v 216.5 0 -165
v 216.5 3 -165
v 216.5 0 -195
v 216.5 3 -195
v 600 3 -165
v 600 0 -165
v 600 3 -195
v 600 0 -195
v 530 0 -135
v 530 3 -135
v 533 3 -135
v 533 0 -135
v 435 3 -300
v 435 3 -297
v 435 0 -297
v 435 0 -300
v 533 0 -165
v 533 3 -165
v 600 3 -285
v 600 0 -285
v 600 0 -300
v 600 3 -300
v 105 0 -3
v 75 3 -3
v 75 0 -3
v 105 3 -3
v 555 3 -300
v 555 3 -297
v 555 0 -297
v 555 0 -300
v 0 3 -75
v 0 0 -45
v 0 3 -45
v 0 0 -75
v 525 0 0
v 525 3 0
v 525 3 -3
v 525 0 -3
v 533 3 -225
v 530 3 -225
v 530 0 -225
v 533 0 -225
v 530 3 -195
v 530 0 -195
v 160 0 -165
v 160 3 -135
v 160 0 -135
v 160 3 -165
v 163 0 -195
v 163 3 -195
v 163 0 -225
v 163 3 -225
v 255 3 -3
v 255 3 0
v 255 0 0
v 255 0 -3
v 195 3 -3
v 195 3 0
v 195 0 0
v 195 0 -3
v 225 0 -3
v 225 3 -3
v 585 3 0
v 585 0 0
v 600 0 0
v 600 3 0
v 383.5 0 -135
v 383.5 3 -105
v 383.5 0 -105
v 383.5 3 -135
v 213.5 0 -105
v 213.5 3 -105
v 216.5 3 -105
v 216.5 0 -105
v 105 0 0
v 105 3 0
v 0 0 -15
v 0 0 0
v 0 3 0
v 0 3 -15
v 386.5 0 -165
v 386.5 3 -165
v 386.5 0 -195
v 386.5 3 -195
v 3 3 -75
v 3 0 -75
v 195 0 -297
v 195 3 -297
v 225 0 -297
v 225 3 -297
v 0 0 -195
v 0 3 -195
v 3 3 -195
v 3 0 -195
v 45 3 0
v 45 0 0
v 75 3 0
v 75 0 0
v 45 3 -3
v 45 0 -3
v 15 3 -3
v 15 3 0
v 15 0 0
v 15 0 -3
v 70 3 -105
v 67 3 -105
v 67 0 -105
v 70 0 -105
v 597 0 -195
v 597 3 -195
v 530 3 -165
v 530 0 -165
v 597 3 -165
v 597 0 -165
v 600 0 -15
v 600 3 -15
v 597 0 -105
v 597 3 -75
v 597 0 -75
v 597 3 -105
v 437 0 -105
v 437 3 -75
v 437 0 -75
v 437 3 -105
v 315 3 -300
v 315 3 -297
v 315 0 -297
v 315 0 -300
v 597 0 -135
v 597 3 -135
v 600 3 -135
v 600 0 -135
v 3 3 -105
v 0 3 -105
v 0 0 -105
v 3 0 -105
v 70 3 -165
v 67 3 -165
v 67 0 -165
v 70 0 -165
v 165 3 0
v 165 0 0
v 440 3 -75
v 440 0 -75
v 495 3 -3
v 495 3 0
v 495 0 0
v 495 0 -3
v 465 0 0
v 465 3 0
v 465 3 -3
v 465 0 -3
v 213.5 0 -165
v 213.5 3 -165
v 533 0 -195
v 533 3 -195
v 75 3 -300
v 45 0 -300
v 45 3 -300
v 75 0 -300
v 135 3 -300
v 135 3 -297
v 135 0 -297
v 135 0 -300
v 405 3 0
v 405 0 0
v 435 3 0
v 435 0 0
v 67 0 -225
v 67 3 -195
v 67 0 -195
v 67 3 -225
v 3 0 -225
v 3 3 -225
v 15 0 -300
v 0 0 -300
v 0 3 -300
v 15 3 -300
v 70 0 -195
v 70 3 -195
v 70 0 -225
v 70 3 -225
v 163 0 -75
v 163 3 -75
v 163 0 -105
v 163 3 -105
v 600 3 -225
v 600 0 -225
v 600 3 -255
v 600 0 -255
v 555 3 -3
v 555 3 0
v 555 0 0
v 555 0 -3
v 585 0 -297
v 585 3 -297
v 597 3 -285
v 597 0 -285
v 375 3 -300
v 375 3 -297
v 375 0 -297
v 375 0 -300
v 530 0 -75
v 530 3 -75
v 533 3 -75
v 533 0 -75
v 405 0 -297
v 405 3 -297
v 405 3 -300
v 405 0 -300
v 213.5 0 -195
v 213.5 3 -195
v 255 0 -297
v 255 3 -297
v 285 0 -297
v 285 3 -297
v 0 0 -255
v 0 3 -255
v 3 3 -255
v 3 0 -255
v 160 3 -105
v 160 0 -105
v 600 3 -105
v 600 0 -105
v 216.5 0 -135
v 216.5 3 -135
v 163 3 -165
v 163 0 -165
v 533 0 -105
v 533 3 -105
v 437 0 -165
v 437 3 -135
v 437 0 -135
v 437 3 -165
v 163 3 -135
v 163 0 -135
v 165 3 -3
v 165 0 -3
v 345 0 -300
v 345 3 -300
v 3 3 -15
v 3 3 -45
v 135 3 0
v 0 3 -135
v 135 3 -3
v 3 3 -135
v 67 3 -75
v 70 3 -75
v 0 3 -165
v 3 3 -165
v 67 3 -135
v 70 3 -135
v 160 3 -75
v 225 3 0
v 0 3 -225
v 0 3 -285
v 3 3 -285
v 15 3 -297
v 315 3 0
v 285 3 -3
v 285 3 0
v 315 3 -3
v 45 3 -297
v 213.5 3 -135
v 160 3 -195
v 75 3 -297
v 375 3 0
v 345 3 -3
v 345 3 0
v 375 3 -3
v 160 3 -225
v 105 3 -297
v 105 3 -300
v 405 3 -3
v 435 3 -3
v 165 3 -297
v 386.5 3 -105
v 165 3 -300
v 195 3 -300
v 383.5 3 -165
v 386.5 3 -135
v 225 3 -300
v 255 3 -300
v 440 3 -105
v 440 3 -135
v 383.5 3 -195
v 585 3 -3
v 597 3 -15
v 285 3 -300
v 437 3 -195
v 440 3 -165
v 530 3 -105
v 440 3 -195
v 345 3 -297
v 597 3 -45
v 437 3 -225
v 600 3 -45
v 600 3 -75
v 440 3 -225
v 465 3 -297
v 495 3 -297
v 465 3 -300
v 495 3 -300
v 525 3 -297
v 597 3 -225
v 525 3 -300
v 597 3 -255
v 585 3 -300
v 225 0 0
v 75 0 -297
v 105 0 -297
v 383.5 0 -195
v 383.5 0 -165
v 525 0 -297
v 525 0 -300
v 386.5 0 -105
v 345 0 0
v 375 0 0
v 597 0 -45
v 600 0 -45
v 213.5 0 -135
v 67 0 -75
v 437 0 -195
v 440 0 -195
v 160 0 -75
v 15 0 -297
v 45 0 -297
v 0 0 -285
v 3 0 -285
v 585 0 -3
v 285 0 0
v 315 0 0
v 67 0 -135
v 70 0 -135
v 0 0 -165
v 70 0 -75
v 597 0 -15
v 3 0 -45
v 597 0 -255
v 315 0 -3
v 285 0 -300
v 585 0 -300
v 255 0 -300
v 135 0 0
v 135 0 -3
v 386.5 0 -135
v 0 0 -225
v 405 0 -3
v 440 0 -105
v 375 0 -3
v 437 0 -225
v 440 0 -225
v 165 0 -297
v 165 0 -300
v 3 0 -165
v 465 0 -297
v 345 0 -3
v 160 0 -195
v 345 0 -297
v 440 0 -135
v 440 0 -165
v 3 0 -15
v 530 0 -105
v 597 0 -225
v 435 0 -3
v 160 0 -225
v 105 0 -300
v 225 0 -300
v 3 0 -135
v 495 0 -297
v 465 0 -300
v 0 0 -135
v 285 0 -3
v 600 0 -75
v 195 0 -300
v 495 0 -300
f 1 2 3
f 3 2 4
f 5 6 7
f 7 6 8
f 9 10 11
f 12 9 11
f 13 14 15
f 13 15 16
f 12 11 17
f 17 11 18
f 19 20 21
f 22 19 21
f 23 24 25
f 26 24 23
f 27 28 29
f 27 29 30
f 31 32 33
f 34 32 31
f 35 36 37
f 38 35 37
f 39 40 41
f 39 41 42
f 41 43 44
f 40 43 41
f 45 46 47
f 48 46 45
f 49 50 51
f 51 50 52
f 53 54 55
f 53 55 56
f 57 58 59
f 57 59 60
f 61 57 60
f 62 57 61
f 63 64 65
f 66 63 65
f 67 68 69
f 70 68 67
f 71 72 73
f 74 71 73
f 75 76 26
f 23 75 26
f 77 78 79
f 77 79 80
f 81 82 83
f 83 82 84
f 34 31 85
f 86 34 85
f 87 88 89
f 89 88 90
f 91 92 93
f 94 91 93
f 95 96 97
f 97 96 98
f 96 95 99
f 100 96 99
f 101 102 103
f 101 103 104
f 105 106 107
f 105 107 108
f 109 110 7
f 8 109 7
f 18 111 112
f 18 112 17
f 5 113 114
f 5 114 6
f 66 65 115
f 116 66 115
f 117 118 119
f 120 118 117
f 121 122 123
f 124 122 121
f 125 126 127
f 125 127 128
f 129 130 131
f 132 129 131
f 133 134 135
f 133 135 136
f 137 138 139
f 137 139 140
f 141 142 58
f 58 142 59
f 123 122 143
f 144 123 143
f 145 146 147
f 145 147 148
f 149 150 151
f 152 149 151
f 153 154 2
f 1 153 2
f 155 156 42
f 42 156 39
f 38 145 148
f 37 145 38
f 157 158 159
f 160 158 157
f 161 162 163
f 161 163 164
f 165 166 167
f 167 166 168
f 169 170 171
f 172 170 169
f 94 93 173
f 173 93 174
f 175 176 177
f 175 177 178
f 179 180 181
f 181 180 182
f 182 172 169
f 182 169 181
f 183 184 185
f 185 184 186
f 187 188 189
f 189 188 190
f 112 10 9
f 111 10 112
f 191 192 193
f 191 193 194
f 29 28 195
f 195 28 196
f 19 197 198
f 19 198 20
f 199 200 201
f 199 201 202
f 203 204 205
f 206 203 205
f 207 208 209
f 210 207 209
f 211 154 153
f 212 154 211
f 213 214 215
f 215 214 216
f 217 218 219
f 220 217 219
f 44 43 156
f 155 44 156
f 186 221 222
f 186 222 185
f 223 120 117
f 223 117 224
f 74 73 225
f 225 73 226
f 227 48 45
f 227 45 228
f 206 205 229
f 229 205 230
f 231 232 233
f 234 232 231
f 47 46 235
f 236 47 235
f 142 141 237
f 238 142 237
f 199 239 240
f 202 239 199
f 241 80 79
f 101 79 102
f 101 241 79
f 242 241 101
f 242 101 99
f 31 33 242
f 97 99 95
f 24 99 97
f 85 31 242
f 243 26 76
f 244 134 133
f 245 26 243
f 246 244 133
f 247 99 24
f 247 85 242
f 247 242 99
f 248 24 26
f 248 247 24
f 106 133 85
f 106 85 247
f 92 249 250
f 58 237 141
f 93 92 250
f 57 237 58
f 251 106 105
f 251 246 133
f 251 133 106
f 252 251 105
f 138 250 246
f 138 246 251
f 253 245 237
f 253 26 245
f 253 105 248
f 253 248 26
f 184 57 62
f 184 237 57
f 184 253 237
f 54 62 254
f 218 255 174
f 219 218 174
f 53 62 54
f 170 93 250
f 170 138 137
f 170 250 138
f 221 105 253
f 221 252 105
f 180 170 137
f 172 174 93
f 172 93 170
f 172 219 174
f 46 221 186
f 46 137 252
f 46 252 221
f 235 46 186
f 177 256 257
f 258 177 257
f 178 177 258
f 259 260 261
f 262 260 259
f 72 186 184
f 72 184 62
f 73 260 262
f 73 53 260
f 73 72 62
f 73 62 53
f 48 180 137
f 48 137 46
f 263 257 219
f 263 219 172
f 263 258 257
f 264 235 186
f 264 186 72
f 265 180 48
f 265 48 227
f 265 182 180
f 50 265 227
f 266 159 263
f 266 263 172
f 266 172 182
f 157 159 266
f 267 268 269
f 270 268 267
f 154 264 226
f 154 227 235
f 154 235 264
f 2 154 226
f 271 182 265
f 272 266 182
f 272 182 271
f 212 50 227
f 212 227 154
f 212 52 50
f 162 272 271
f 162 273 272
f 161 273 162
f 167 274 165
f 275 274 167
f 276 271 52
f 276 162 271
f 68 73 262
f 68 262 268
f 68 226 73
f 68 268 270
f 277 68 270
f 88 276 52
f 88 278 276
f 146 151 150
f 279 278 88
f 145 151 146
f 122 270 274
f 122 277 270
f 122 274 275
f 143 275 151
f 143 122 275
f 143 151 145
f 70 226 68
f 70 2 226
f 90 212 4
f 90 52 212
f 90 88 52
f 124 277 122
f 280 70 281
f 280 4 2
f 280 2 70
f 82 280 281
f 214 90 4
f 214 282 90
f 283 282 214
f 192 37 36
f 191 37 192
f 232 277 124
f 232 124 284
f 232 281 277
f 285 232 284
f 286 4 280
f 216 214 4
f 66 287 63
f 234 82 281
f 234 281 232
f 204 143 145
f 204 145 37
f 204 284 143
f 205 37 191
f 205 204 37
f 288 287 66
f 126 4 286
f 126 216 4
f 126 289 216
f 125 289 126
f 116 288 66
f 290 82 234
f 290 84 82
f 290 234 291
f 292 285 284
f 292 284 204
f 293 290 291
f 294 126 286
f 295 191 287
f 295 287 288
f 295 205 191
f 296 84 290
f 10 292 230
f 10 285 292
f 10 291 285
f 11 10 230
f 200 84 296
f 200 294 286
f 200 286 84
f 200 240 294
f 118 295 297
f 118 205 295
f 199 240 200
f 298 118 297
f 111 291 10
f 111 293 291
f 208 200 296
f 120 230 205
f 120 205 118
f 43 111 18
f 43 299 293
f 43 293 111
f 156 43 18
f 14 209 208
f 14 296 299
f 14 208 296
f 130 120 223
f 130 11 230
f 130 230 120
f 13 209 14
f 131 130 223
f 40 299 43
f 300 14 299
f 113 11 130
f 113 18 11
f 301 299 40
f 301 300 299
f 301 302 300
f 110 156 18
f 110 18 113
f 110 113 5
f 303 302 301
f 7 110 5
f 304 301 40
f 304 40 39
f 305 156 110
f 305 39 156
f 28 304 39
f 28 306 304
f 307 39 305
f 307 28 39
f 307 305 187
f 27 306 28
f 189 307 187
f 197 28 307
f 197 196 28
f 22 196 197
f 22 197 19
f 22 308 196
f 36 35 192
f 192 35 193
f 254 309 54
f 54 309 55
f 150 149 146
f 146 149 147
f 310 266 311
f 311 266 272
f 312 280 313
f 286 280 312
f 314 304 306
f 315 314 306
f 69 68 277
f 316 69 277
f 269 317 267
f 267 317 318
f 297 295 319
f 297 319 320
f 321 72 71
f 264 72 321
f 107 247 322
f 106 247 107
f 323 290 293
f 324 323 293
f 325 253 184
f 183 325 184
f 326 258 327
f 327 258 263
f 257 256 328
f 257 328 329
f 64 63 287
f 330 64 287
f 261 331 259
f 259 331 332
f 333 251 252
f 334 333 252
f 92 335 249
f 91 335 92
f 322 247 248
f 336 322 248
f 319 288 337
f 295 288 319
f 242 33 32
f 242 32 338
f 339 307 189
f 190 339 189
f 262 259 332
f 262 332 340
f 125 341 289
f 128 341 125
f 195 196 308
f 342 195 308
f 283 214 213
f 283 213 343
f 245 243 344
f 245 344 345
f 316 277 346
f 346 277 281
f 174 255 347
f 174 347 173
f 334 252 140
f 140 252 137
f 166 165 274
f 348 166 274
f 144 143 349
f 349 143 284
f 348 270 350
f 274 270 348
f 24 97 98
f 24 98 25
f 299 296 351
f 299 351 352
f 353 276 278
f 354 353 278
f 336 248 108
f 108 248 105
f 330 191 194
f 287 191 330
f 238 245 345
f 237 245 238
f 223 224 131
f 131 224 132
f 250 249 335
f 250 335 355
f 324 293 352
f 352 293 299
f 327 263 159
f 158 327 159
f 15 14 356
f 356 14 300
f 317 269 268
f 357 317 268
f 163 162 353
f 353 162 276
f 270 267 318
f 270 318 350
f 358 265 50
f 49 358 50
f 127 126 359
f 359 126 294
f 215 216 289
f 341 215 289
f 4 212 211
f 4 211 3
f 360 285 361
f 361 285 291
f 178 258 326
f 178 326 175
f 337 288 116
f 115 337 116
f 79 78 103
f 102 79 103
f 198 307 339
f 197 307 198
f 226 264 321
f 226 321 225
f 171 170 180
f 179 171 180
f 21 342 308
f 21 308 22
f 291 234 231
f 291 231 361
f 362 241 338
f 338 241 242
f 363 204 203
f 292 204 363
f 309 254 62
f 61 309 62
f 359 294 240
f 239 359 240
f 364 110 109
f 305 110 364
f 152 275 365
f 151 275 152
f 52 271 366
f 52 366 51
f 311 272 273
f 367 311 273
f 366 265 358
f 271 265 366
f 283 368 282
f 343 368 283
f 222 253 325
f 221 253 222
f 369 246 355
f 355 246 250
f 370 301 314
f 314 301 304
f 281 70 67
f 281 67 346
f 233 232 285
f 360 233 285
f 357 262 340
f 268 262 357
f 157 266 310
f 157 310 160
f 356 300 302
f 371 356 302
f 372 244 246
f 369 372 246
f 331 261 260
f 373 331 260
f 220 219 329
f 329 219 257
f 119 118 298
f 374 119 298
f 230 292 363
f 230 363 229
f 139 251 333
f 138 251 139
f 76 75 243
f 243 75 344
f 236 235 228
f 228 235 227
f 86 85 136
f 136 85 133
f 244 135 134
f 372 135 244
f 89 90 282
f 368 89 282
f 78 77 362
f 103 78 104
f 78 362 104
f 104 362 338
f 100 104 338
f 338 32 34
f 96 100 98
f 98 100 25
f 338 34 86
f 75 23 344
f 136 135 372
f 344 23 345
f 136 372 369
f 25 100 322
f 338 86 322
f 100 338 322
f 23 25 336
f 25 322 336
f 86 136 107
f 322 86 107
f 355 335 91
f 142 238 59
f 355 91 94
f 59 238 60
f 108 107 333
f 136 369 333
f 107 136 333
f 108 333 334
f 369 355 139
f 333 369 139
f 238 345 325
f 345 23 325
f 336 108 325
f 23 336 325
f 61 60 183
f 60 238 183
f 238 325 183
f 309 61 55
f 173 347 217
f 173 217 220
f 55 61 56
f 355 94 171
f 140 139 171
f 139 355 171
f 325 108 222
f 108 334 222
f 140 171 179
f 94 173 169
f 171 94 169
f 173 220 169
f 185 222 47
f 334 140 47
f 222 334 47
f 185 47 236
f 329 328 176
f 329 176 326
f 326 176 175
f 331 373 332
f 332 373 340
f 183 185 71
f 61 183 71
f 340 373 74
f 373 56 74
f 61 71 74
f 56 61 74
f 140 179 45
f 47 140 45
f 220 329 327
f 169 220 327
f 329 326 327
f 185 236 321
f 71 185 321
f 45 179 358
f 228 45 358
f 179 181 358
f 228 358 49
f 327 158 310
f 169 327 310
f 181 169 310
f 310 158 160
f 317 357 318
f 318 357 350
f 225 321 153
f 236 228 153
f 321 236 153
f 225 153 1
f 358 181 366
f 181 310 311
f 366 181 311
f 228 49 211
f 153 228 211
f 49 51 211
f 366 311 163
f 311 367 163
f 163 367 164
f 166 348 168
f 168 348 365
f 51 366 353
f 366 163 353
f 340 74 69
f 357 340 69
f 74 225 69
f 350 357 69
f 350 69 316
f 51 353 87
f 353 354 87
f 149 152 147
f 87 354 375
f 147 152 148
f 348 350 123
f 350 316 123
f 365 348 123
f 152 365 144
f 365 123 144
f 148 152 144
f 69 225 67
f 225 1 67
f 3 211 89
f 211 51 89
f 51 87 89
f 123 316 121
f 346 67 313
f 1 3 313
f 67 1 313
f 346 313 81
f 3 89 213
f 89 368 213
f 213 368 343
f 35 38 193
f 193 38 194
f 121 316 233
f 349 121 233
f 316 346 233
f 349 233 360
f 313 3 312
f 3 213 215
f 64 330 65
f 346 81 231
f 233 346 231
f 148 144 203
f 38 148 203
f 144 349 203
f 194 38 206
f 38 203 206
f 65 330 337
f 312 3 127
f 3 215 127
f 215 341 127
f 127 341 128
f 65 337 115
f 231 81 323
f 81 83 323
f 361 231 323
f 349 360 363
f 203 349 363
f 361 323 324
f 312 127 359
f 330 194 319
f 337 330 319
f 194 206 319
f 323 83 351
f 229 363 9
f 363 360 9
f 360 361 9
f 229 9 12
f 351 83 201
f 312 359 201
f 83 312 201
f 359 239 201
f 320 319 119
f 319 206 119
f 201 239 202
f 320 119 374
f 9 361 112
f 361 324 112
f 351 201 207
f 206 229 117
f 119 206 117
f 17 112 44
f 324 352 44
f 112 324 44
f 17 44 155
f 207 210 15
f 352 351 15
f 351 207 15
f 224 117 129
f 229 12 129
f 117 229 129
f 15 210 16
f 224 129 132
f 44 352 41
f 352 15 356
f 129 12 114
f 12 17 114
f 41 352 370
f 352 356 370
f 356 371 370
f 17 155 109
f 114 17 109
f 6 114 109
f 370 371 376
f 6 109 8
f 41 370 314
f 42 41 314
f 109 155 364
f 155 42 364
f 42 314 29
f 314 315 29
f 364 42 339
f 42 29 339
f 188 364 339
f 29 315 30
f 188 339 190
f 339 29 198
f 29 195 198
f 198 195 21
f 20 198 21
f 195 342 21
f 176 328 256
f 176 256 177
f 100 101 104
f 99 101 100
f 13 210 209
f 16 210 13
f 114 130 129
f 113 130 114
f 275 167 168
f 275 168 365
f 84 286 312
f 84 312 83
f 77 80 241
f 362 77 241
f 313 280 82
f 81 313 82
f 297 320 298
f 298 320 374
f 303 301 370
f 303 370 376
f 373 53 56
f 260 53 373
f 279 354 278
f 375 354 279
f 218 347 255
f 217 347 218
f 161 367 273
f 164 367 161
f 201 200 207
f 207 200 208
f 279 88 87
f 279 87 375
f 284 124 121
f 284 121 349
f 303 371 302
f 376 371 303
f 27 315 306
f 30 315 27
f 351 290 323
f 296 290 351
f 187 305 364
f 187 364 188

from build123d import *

# Parameters (mm, degrees)
SKETCH1_W           = 600
SKETCH1_H           = 300
BOSS_EXTRUDE1_DEPTH = 3
SKETCH2_W           = 30
SKETCH2_H           = 3
SKETCH2_W_2         = 3
SKETCH2_H_2         = 30
CUT_EXTRUDE1_DEPTH  = 5
SKETCH3_W           = 3
SKETCH3_H           = 30
CUT_EXTRUDE2_DEPTH  = 10
SKETCH4_W           = 3
SKETCH4_H           = 30
CUT_EXTRUDE3_DEPTH  = 5


with BuildPart() as part:
    # Sketch1 → Boss-Extrude1 (new body)
    with BuildSketch(Plane(origin=(0, 0, 0), x_dir=(1, 0, 0), z_dir=(0, 1, 0))):
        with Locations((300, 150)):
            Rectangle(SKETCH1_W, SKETCH1_H)
    extrude(amount=BOSS_EXTRUDE1_DEPTH)

    # Sketch2 → Cut-Extrude1 (cut)
    with BuildSketch(Plane(origin=(0, 3, 0), x_dir=(1, 0, 0), z_dir=(0, 1, 0))):
        with Locations((90, 1.5)):
            Rectangle(SKETCH2_W, SKETCH2_H)
        with Locations((30, 1.5)):
            Rectangle(SKETCH2_W, SKETCH2_H)
        with Locations((150, 1.5)):
            Rectangle(SKETCH2_W, SKETCH2_H)
        with Locations((210, 1.5)):
            Rectangle(SKETCH2_W, SKETCH2_H)
        with Locations((270, 1.5)):
            Rectangle(SKETCH2_W, SKETCH2_H)
        with Locations((330, 1.5)):
            Rectangle(SKETCH2_W, SKETCH2_H)
        with Locations((390, 1.5)):
            Rectangle(SKETCH2_W, SKETCH2_H)
        with Locations((450, 1.5)):
            Rectangle(SKETCH2_W, SKETCH2_H)
        with Locations((510, 1.5)):
            Rectangle(SKETCH2_W, SKETCH2_H)
        with Locations((570, 1.5)):
            Rectangle(SKETCH2_W, SKETCH2_H)
        with Locations((570, 298.5)):
            Rectangle(SKETCH2_W, SKETCH2_H)
        with Locations((510, 298.5)):
            Rectangle(SKETCH2_W, SKETCH2_H)
        with Locations((450, 298.5)):
            Rectangle(SKETCH2_W, SKETCH2_H)
        with Locations((390, 298.5)):
            Rectangle(SKETCH2_W, SKETCH2_H)
        with Locations((330, 298.5)):
            Rectangle(SKETCH2_W, SKETCH2_H)
        with Locations((270, 298.5)):
            Rectangle(SKETCH2_W, SKETCH2_H)
        with Locations((210, 298.5)):
            Rectangle(SKETCH2_W, SKETCH2_H)
        with Locations((150, 298.5)):
            Rectangle(SKETCH2_W, SKETCH2_H)
        with Locations((90, 298.5)):
            Rectangle(SKETCH2_W, SKETCH2_H)
        with Locations((30, 298.5)):
            Rectangle(SKETCH2_W, SKETCH2_H)
        with Locations((1.5, 210)):
            Rectangle(SKETCH2_W_2, SKETCH2_H_2)
        with Locations((1.5, 270)):
            Rectangle(SKETCH2_W_2, SKETCH2_H_2)
        with Locations((1.5, 150)):
            Rectangle(SKETCH2_W_2, SKETCH2_H_2)
        with Locations((1.5, 90)):
            Rectangle(SKETCH2_W_2, SKETCH2_H_2)
        with Locations((1.5, 30)):
            Rectangle(SKETCH2_W_2, SKETCH2_H_2)
        with Locations((598.5, 30)):
            Rectangle(SKETCH2_W_2, SKETCH2_H_2)
        with Locations((598.5, 90)):
            Rectangle(SKETCH2_W_2, SKETCH2_H_2)
        with Locations((598.5, 150)):
            Rectangle(SKETCH2_W_2, SKETCH2_H_2)
        with Locations((598.5, 210)):
            Rectangle(SKETCH2_W_2, SKETCH2_H_2)
        with Locations((598.5, 270)):
            Rectangle(SKETCH2_W_2, SKETCH2_H_2)
    extrude(amount=-CUT_EXTRUDE1_DEPTH, mode=Mode.SUBTRACT)

    # Sketch3 → Cut-Extrude2 (cut)
    with BuildSketch(Plane(origin=(0, 3, 0), x_dir=(1, 0, 0), z_dir=(0, 1, 0))):
        with Locations((68.5, 210)):
            Rectangle(SKETCH3_W, SKETCH3_H)
        with Locations((68.5, 150)):
            Rectangle(SKETCH3_W, SKETCH3_H)
        with Locations((68.5, 90)):
            Rectangle(SKETCH3_W, SKETCH3_H)
        with Locations((161.5, 90)):
            Rectangle(SKETCH3_W, SKETCH3_H)
        with Locations((161.5, 150)):
            Rectangle(SKETCH3_W, SKETCH3_H)
        with Locations((161.5, 210)):
            Rectangle(SKETCH3_W, SKETCH3_H)
        with Locations((438.5, 210)):
            Rectangle(SKETCH3_W, SKETCH3_H)
        with Locations((438.5, 150)):
            Rectangle(SKETCH3_W, SKETCH3_H)
        with Locations((438.5, 90)):
            Rectangle(SKETCH3_W, SKETCH3_H)
        with Locations((531.5, 90)):
            Rectangle(SKETCH3_W, SKETCH3_H)
        with Locations((531.5, 150)):
            Rectangle(SKETCH3_W, SKETCH3_H)
        with Locations((531.5, 210)):
            Rectangle(SKETCH3_W, SKETCH3_H)
    extrude(amount=-CUT_EXTRUDE2_DEPTH, mode=Mode.SUBTRACT)

    # Sketch4 → Cut-Extrude3 (cut)
    with BuildSketch(Plane(origin=(0, 3, 0), x_dir=(1, 0, 0), z_dir=(0, 1, 0))):
        with Locations((215, 180)):
            Rectangle(SKETCH4_W, SKETCH4_H)
        with Locations((215, 120)):
            Rectangle(SKETCH4_W, SKETCH4_H)
        with Locations((385, 120)):
            Rectangle(SKETCH4_W, SKETCH4_H)
        with Locations((385, 180)):
            Rectangle(SKETCH4_W, SKETCH4_H)
    extrude(amount=-CUT_EXTRUDE3_DEPTH, mode=Mode.SUBTRACT)


solid = part.part
